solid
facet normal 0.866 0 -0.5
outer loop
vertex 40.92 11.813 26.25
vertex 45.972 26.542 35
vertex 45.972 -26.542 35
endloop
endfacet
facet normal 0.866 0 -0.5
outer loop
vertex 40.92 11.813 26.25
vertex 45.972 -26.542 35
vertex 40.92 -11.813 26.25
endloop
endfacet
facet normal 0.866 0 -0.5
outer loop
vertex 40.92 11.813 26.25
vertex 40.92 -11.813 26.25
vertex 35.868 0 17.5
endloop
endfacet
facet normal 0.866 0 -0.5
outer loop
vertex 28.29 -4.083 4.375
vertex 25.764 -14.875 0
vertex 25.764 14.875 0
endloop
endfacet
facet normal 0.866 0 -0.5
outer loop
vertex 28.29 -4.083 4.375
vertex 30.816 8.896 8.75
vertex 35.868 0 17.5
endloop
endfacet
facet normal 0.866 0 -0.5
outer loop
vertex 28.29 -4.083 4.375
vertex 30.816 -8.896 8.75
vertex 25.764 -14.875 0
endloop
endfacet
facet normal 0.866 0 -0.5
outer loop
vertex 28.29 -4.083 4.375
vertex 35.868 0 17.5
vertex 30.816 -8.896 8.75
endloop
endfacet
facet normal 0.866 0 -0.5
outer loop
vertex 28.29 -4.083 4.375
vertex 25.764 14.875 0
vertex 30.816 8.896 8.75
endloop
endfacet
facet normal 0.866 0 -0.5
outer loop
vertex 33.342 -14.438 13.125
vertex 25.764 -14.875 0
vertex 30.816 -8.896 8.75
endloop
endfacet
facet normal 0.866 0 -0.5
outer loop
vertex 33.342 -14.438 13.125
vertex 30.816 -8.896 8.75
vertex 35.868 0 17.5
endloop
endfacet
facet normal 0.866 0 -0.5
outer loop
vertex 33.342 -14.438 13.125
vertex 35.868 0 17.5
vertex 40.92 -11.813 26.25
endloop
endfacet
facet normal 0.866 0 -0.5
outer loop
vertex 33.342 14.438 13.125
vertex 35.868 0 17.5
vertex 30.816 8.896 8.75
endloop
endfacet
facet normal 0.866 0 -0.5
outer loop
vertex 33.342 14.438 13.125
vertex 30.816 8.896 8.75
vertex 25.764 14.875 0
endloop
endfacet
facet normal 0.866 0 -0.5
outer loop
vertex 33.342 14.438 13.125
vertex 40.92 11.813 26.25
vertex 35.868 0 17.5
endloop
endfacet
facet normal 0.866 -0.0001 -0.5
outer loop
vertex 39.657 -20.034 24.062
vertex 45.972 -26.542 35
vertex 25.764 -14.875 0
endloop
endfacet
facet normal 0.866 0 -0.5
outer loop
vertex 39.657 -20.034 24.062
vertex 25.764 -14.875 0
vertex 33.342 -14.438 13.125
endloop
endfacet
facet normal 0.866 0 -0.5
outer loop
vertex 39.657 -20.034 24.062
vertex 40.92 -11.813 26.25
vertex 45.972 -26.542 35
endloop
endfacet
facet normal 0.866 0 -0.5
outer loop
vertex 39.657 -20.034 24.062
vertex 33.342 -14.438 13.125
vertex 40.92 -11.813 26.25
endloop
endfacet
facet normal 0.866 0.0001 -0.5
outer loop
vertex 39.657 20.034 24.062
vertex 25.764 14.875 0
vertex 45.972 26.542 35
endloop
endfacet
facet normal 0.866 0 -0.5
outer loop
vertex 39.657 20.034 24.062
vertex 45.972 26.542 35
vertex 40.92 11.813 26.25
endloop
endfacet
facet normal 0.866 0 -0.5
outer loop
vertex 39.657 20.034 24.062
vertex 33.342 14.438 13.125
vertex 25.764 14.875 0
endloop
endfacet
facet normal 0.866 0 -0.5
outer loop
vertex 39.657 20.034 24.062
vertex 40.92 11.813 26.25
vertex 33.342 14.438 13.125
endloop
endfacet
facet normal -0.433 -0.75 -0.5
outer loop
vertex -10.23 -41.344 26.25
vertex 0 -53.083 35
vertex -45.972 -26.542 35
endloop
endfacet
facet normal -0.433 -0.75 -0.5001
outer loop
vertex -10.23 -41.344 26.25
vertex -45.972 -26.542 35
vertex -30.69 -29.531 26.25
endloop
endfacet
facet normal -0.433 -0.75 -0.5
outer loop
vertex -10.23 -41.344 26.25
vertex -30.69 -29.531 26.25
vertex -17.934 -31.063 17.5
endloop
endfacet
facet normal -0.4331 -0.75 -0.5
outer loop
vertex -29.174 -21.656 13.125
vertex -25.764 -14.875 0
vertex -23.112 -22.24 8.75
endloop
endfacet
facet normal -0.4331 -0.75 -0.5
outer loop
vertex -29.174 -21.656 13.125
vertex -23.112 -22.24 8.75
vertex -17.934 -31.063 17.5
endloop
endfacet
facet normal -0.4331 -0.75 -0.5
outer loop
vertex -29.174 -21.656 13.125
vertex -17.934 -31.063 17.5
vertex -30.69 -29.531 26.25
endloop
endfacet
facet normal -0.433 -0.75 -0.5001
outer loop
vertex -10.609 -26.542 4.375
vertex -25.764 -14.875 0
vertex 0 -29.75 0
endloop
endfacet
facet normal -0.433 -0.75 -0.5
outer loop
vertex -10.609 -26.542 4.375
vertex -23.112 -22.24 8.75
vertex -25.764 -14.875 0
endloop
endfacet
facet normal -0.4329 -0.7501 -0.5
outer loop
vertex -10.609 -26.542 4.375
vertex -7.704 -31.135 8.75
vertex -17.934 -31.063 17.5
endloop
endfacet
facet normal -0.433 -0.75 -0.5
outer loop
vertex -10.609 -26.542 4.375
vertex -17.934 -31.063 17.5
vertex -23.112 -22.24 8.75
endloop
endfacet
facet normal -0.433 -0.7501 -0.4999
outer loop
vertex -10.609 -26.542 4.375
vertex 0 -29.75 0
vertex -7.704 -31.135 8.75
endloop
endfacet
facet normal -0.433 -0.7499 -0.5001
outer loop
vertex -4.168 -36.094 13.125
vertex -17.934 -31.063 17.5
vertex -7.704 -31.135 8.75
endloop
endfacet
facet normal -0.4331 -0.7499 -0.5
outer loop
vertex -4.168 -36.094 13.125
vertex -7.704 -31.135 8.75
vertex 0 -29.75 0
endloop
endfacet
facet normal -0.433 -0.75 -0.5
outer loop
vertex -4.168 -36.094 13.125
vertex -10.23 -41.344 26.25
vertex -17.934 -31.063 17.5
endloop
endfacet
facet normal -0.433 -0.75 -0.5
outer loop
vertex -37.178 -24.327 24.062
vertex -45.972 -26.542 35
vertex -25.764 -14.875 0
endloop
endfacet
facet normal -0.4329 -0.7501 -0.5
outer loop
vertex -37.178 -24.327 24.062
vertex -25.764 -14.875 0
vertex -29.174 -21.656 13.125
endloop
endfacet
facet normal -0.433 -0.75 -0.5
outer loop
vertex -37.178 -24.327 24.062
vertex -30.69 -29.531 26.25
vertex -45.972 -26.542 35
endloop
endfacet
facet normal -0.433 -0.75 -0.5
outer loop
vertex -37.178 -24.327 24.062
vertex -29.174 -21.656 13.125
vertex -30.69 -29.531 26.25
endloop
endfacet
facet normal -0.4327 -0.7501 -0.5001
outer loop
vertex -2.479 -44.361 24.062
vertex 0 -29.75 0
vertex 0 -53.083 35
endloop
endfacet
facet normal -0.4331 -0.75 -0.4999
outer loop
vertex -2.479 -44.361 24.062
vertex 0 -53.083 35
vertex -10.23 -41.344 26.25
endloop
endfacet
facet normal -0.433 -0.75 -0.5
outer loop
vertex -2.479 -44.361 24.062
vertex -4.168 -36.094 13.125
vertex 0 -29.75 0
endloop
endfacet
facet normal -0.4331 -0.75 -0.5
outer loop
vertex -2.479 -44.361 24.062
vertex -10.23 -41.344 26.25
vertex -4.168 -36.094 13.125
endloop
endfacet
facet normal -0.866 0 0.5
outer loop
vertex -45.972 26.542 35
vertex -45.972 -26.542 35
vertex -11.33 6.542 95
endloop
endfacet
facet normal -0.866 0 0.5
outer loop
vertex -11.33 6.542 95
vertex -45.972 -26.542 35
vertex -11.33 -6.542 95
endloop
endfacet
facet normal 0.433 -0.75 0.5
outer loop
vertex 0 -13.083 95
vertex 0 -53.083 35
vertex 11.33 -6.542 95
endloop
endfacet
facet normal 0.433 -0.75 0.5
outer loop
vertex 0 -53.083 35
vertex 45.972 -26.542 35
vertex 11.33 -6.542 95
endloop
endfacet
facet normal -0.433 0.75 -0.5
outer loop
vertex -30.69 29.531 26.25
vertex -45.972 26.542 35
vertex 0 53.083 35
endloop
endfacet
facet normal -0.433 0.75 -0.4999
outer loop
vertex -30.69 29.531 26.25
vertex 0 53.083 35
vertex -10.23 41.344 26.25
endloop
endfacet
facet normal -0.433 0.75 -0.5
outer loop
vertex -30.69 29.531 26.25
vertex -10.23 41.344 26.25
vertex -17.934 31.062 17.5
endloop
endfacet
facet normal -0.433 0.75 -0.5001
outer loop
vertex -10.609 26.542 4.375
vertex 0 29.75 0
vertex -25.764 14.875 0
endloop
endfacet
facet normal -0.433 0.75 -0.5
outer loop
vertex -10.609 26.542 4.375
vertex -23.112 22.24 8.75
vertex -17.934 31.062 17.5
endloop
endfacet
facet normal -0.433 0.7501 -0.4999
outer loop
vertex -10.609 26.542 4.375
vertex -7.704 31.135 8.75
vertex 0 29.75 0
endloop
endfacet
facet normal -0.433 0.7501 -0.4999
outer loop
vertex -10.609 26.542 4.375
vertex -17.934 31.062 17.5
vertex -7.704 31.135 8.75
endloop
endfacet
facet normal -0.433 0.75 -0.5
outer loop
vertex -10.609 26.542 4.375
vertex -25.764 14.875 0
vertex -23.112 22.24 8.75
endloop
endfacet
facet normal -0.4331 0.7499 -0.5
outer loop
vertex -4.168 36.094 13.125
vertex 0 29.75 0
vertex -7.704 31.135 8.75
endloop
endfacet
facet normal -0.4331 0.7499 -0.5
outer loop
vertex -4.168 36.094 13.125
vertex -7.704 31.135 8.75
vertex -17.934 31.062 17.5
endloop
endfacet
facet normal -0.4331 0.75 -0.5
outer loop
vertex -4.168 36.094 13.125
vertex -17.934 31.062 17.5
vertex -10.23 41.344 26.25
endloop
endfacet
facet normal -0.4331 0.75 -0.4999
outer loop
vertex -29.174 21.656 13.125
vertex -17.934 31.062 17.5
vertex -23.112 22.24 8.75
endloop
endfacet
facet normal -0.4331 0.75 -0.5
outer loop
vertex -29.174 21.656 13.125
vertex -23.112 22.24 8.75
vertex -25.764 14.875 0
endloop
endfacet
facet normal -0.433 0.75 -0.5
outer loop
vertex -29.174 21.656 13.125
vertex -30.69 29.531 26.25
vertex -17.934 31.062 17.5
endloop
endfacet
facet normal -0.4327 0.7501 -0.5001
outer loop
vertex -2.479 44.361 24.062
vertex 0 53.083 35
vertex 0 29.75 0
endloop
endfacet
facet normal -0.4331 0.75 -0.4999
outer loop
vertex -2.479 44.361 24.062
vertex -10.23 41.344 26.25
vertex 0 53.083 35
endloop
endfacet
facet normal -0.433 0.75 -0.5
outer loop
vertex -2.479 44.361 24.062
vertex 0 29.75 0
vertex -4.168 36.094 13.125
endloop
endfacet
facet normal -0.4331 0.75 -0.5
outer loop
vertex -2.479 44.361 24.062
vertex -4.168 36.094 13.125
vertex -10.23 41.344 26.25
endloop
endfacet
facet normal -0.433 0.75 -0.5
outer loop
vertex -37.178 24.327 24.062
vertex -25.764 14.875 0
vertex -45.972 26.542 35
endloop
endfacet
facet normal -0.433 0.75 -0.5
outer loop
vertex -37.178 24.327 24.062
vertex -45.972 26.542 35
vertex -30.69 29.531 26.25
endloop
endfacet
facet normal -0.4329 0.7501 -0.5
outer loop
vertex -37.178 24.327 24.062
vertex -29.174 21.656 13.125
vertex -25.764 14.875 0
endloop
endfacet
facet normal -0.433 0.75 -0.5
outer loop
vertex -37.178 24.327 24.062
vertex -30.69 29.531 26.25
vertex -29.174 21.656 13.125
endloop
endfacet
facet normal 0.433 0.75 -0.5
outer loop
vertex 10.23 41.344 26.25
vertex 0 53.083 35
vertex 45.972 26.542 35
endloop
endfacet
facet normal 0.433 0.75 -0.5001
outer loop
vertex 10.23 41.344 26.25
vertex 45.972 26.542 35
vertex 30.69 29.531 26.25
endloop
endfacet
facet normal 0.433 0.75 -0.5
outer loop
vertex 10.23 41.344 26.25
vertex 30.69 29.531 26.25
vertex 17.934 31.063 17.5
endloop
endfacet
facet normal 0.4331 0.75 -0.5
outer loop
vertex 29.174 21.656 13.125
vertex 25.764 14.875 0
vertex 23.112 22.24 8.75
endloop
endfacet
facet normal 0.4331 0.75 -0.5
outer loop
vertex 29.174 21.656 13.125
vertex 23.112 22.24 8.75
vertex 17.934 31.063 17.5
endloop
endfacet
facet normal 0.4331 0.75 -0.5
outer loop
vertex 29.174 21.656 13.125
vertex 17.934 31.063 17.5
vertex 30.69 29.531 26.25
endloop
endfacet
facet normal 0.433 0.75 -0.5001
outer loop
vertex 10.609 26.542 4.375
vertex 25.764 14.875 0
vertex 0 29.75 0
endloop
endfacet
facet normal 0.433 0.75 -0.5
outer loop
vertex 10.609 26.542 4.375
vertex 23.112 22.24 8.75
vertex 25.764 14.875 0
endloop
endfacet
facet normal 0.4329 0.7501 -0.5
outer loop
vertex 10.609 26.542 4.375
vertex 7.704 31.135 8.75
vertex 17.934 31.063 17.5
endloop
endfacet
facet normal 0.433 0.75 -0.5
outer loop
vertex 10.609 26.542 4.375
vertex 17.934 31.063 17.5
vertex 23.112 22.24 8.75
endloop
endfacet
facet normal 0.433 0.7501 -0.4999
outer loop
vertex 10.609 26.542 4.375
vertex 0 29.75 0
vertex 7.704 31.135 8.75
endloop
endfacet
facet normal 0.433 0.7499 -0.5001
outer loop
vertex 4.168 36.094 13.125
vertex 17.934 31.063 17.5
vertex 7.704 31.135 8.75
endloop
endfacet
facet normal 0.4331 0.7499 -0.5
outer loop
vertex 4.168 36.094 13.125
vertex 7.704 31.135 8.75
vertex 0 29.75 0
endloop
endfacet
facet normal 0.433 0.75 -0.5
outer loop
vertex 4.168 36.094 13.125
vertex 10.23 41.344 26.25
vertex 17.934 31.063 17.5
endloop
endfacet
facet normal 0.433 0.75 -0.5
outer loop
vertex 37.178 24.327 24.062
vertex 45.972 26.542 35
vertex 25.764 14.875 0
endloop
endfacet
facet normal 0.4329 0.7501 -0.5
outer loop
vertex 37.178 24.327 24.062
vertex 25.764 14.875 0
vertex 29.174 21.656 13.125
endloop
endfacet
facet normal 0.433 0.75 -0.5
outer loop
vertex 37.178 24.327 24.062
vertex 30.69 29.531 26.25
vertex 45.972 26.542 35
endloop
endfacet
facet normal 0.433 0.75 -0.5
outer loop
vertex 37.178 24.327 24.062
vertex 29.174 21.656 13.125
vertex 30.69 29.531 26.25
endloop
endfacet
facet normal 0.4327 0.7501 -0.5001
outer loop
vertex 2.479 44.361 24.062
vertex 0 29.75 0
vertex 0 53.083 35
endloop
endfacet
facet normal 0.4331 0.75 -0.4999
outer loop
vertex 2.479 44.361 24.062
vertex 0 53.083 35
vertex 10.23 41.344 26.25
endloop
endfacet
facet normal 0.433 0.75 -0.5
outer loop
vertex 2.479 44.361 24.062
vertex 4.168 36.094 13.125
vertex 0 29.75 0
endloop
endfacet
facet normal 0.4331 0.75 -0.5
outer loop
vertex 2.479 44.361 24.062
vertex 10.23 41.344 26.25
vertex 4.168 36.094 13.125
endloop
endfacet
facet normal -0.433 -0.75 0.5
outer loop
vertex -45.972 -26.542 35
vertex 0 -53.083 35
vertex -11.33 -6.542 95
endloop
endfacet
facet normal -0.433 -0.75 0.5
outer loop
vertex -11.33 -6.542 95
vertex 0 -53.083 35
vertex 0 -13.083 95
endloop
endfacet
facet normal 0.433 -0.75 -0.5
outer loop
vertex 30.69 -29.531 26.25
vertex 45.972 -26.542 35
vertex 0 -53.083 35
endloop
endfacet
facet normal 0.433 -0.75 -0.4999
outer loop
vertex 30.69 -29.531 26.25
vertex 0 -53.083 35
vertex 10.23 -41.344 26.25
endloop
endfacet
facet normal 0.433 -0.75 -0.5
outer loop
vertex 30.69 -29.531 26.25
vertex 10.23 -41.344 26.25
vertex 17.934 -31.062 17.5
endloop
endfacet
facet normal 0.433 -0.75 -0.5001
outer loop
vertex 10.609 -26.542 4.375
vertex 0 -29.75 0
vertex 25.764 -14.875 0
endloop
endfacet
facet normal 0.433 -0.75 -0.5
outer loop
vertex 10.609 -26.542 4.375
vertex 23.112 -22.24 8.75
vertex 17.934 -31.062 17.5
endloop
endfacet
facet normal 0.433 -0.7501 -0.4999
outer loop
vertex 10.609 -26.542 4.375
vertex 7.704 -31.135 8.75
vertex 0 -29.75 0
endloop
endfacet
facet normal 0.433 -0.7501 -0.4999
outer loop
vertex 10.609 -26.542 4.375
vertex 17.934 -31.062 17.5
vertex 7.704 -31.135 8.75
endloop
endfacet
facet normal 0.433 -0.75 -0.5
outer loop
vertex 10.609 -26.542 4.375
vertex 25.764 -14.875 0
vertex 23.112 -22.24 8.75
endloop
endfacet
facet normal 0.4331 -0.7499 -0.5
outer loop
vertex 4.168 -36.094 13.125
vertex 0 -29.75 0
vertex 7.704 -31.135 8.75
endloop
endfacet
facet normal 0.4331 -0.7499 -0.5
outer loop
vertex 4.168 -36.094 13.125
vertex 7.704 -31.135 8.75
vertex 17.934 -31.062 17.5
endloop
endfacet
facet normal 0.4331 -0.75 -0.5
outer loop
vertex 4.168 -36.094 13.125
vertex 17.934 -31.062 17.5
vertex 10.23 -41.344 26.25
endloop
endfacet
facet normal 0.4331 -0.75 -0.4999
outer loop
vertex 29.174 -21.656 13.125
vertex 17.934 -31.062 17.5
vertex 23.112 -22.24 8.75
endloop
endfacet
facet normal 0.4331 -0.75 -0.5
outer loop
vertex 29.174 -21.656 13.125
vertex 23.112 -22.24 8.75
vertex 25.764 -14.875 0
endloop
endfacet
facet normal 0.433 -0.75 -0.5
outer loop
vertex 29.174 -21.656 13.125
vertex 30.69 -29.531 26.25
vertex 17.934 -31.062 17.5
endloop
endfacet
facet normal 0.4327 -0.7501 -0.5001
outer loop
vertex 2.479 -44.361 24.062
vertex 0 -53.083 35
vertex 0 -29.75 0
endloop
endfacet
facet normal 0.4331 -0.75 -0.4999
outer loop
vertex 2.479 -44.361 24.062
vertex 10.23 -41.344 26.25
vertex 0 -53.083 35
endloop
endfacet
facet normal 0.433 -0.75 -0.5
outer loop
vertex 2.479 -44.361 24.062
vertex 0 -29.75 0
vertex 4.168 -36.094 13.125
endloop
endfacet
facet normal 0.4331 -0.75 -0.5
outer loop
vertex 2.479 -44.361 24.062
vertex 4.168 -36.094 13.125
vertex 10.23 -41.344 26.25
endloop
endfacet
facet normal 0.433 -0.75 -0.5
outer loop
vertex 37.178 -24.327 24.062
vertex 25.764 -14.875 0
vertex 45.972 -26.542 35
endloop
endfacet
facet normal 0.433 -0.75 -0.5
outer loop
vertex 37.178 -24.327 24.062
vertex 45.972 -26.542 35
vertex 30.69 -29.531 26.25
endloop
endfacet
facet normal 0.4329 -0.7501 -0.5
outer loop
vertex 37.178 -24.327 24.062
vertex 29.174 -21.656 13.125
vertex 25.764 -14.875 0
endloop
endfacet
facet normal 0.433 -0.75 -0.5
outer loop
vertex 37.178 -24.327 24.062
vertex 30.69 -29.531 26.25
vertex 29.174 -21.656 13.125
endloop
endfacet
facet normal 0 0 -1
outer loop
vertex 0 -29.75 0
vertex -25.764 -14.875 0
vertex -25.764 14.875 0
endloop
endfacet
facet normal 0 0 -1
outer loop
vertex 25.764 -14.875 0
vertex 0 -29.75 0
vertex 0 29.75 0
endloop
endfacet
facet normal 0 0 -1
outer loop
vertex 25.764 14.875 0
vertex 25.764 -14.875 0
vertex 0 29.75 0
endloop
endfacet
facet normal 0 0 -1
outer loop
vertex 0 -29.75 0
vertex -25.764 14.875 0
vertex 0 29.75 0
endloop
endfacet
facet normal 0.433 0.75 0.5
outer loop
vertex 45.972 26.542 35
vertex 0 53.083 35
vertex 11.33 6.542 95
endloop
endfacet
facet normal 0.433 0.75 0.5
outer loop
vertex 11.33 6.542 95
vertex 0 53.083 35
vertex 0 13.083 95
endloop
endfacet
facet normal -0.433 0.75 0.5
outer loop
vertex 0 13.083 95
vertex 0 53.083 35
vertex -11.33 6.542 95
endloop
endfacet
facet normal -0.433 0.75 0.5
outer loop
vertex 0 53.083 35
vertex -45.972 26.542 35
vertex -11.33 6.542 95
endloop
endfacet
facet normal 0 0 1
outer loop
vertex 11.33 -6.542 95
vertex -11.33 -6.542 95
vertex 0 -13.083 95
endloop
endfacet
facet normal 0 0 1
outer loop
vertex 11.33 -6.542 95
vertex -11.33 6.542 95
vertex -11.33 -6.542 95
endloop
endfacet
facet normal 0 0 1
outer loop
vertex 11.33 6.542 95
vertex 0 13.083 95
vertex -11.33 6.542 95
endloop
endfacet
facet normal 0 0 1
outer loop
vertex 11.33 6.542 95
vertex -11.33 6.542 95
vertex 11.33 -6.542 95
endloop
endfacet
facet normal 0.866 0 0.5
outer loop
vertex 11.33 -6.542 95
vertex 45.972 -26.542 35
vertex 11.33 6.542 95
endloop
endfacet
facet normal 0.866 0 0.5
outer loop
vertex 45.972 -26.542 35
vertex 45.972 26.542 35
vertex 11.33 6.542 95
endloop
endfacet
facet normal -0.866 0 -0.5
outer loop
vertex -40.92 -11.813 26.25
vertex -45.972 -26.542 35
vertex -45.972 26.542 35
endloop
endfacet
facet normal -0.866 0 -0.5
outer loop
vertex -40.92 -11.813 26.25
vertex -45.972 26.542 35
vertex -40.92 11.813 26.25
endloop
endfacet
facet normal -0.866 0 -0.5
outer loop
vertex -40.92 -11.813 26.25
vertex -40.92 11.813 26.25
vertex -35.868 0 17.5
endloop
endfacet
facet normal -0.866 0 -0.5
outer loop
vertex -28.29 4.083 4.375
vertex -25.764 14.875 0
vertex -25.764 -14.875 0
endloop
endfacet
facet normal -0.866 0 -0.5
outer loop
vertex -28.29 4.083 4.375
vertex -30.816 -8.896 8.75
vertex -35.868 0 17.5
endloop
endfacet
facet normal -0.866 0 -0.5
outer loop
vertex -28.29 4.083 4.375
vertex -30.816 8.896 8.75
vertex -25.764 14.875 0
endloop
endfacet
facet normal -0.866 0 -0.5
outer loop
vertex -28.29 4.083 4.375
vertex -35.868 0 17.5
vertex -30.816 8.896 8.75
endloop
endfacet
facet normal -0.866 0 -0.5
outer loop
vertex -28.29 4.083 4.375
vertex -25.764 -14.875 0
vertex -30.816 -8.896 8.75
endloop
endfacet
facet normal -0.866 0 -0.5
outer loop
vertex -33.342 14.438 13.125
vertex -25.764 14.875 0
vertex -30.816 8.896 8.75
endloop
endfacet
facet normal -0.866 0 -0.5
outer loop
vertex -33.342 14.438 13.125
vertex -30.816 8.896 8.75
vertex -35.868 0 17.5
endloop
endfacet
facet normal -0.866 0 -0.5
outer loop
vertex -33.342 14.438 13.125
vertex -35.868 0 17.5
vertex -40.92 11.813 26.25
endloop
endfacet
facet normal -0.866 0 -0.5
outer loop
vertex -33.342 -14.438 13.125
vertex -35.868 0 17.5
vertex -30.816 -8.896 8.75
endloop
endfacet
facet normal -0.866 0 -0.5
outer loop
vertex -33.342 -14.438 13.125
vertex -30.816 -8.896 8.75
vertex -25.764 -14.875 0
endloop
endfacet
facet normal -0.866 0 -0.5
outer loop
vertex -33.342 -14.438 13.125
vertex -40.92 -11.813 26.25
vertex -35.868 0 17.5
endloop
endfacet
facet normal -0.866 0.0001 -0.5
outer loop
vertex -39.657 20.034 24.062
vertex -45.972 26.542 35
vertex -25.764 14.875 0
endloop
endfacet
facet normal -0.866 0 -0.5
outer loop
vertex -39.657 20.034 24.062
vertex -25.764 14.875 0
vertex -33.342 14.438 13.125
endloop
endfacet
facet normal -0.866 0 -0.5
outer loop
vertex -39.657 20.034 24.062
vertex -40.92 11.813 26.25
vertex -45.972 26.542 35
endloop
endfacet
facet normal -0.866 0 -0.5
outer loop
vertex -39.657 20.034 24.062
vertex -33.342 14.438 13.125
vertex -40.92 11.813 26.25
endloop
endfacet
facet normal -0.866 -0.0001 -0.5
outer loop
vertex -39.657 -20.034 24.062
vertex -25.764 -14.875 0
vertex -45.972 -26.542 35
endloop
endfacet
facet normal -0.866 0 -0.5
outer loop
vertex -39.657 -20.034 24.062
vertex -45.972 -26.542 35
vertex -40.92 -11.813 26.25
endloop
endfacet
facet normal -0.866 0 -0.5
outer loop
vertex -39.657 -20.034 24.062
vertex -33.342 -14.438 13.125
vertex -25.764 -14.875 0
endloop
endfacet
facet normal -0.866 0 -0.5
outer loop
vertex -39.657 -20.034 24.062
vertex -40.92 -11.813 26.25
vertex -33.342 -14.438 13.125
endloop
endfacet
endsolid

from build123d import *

# Parameters (mm, degrees)
F1_DEPTH = 35
F1_TAPER = -30
F2_DEPTH = 60
F2_TAPER = 30


with BuildPart() as f1:
    # F0 (on Top) → F1 (new body)
    with BuildSketch(Plane.XY):
        Polygon((-25.7642557626, -14.875), (0, -29.75), (25.7642557626, -14.875), (25.7642557626, 14.875), (0, 29.75), (-25.7642557626, 14.875), align=None)
    extrude(amount=F1_DEPTH, taper=F1_TAPER)

    # F1_face (on face) → F2 (join)
    with BuildSketch(Plane.XY.offset(35)):
        Polygon((-45.9715151842, -26.5416666667), (0, -53.0833333333), (45.9715151842, -26.5416666667), (45.9715151842, 26.5416666667), (0, 53.0833333333), (-45.9715151842, 26.5416666667), align=None)
    extrude(amount=F2_DEPTH, taper=F2_TAPER)


solid = f1.part
